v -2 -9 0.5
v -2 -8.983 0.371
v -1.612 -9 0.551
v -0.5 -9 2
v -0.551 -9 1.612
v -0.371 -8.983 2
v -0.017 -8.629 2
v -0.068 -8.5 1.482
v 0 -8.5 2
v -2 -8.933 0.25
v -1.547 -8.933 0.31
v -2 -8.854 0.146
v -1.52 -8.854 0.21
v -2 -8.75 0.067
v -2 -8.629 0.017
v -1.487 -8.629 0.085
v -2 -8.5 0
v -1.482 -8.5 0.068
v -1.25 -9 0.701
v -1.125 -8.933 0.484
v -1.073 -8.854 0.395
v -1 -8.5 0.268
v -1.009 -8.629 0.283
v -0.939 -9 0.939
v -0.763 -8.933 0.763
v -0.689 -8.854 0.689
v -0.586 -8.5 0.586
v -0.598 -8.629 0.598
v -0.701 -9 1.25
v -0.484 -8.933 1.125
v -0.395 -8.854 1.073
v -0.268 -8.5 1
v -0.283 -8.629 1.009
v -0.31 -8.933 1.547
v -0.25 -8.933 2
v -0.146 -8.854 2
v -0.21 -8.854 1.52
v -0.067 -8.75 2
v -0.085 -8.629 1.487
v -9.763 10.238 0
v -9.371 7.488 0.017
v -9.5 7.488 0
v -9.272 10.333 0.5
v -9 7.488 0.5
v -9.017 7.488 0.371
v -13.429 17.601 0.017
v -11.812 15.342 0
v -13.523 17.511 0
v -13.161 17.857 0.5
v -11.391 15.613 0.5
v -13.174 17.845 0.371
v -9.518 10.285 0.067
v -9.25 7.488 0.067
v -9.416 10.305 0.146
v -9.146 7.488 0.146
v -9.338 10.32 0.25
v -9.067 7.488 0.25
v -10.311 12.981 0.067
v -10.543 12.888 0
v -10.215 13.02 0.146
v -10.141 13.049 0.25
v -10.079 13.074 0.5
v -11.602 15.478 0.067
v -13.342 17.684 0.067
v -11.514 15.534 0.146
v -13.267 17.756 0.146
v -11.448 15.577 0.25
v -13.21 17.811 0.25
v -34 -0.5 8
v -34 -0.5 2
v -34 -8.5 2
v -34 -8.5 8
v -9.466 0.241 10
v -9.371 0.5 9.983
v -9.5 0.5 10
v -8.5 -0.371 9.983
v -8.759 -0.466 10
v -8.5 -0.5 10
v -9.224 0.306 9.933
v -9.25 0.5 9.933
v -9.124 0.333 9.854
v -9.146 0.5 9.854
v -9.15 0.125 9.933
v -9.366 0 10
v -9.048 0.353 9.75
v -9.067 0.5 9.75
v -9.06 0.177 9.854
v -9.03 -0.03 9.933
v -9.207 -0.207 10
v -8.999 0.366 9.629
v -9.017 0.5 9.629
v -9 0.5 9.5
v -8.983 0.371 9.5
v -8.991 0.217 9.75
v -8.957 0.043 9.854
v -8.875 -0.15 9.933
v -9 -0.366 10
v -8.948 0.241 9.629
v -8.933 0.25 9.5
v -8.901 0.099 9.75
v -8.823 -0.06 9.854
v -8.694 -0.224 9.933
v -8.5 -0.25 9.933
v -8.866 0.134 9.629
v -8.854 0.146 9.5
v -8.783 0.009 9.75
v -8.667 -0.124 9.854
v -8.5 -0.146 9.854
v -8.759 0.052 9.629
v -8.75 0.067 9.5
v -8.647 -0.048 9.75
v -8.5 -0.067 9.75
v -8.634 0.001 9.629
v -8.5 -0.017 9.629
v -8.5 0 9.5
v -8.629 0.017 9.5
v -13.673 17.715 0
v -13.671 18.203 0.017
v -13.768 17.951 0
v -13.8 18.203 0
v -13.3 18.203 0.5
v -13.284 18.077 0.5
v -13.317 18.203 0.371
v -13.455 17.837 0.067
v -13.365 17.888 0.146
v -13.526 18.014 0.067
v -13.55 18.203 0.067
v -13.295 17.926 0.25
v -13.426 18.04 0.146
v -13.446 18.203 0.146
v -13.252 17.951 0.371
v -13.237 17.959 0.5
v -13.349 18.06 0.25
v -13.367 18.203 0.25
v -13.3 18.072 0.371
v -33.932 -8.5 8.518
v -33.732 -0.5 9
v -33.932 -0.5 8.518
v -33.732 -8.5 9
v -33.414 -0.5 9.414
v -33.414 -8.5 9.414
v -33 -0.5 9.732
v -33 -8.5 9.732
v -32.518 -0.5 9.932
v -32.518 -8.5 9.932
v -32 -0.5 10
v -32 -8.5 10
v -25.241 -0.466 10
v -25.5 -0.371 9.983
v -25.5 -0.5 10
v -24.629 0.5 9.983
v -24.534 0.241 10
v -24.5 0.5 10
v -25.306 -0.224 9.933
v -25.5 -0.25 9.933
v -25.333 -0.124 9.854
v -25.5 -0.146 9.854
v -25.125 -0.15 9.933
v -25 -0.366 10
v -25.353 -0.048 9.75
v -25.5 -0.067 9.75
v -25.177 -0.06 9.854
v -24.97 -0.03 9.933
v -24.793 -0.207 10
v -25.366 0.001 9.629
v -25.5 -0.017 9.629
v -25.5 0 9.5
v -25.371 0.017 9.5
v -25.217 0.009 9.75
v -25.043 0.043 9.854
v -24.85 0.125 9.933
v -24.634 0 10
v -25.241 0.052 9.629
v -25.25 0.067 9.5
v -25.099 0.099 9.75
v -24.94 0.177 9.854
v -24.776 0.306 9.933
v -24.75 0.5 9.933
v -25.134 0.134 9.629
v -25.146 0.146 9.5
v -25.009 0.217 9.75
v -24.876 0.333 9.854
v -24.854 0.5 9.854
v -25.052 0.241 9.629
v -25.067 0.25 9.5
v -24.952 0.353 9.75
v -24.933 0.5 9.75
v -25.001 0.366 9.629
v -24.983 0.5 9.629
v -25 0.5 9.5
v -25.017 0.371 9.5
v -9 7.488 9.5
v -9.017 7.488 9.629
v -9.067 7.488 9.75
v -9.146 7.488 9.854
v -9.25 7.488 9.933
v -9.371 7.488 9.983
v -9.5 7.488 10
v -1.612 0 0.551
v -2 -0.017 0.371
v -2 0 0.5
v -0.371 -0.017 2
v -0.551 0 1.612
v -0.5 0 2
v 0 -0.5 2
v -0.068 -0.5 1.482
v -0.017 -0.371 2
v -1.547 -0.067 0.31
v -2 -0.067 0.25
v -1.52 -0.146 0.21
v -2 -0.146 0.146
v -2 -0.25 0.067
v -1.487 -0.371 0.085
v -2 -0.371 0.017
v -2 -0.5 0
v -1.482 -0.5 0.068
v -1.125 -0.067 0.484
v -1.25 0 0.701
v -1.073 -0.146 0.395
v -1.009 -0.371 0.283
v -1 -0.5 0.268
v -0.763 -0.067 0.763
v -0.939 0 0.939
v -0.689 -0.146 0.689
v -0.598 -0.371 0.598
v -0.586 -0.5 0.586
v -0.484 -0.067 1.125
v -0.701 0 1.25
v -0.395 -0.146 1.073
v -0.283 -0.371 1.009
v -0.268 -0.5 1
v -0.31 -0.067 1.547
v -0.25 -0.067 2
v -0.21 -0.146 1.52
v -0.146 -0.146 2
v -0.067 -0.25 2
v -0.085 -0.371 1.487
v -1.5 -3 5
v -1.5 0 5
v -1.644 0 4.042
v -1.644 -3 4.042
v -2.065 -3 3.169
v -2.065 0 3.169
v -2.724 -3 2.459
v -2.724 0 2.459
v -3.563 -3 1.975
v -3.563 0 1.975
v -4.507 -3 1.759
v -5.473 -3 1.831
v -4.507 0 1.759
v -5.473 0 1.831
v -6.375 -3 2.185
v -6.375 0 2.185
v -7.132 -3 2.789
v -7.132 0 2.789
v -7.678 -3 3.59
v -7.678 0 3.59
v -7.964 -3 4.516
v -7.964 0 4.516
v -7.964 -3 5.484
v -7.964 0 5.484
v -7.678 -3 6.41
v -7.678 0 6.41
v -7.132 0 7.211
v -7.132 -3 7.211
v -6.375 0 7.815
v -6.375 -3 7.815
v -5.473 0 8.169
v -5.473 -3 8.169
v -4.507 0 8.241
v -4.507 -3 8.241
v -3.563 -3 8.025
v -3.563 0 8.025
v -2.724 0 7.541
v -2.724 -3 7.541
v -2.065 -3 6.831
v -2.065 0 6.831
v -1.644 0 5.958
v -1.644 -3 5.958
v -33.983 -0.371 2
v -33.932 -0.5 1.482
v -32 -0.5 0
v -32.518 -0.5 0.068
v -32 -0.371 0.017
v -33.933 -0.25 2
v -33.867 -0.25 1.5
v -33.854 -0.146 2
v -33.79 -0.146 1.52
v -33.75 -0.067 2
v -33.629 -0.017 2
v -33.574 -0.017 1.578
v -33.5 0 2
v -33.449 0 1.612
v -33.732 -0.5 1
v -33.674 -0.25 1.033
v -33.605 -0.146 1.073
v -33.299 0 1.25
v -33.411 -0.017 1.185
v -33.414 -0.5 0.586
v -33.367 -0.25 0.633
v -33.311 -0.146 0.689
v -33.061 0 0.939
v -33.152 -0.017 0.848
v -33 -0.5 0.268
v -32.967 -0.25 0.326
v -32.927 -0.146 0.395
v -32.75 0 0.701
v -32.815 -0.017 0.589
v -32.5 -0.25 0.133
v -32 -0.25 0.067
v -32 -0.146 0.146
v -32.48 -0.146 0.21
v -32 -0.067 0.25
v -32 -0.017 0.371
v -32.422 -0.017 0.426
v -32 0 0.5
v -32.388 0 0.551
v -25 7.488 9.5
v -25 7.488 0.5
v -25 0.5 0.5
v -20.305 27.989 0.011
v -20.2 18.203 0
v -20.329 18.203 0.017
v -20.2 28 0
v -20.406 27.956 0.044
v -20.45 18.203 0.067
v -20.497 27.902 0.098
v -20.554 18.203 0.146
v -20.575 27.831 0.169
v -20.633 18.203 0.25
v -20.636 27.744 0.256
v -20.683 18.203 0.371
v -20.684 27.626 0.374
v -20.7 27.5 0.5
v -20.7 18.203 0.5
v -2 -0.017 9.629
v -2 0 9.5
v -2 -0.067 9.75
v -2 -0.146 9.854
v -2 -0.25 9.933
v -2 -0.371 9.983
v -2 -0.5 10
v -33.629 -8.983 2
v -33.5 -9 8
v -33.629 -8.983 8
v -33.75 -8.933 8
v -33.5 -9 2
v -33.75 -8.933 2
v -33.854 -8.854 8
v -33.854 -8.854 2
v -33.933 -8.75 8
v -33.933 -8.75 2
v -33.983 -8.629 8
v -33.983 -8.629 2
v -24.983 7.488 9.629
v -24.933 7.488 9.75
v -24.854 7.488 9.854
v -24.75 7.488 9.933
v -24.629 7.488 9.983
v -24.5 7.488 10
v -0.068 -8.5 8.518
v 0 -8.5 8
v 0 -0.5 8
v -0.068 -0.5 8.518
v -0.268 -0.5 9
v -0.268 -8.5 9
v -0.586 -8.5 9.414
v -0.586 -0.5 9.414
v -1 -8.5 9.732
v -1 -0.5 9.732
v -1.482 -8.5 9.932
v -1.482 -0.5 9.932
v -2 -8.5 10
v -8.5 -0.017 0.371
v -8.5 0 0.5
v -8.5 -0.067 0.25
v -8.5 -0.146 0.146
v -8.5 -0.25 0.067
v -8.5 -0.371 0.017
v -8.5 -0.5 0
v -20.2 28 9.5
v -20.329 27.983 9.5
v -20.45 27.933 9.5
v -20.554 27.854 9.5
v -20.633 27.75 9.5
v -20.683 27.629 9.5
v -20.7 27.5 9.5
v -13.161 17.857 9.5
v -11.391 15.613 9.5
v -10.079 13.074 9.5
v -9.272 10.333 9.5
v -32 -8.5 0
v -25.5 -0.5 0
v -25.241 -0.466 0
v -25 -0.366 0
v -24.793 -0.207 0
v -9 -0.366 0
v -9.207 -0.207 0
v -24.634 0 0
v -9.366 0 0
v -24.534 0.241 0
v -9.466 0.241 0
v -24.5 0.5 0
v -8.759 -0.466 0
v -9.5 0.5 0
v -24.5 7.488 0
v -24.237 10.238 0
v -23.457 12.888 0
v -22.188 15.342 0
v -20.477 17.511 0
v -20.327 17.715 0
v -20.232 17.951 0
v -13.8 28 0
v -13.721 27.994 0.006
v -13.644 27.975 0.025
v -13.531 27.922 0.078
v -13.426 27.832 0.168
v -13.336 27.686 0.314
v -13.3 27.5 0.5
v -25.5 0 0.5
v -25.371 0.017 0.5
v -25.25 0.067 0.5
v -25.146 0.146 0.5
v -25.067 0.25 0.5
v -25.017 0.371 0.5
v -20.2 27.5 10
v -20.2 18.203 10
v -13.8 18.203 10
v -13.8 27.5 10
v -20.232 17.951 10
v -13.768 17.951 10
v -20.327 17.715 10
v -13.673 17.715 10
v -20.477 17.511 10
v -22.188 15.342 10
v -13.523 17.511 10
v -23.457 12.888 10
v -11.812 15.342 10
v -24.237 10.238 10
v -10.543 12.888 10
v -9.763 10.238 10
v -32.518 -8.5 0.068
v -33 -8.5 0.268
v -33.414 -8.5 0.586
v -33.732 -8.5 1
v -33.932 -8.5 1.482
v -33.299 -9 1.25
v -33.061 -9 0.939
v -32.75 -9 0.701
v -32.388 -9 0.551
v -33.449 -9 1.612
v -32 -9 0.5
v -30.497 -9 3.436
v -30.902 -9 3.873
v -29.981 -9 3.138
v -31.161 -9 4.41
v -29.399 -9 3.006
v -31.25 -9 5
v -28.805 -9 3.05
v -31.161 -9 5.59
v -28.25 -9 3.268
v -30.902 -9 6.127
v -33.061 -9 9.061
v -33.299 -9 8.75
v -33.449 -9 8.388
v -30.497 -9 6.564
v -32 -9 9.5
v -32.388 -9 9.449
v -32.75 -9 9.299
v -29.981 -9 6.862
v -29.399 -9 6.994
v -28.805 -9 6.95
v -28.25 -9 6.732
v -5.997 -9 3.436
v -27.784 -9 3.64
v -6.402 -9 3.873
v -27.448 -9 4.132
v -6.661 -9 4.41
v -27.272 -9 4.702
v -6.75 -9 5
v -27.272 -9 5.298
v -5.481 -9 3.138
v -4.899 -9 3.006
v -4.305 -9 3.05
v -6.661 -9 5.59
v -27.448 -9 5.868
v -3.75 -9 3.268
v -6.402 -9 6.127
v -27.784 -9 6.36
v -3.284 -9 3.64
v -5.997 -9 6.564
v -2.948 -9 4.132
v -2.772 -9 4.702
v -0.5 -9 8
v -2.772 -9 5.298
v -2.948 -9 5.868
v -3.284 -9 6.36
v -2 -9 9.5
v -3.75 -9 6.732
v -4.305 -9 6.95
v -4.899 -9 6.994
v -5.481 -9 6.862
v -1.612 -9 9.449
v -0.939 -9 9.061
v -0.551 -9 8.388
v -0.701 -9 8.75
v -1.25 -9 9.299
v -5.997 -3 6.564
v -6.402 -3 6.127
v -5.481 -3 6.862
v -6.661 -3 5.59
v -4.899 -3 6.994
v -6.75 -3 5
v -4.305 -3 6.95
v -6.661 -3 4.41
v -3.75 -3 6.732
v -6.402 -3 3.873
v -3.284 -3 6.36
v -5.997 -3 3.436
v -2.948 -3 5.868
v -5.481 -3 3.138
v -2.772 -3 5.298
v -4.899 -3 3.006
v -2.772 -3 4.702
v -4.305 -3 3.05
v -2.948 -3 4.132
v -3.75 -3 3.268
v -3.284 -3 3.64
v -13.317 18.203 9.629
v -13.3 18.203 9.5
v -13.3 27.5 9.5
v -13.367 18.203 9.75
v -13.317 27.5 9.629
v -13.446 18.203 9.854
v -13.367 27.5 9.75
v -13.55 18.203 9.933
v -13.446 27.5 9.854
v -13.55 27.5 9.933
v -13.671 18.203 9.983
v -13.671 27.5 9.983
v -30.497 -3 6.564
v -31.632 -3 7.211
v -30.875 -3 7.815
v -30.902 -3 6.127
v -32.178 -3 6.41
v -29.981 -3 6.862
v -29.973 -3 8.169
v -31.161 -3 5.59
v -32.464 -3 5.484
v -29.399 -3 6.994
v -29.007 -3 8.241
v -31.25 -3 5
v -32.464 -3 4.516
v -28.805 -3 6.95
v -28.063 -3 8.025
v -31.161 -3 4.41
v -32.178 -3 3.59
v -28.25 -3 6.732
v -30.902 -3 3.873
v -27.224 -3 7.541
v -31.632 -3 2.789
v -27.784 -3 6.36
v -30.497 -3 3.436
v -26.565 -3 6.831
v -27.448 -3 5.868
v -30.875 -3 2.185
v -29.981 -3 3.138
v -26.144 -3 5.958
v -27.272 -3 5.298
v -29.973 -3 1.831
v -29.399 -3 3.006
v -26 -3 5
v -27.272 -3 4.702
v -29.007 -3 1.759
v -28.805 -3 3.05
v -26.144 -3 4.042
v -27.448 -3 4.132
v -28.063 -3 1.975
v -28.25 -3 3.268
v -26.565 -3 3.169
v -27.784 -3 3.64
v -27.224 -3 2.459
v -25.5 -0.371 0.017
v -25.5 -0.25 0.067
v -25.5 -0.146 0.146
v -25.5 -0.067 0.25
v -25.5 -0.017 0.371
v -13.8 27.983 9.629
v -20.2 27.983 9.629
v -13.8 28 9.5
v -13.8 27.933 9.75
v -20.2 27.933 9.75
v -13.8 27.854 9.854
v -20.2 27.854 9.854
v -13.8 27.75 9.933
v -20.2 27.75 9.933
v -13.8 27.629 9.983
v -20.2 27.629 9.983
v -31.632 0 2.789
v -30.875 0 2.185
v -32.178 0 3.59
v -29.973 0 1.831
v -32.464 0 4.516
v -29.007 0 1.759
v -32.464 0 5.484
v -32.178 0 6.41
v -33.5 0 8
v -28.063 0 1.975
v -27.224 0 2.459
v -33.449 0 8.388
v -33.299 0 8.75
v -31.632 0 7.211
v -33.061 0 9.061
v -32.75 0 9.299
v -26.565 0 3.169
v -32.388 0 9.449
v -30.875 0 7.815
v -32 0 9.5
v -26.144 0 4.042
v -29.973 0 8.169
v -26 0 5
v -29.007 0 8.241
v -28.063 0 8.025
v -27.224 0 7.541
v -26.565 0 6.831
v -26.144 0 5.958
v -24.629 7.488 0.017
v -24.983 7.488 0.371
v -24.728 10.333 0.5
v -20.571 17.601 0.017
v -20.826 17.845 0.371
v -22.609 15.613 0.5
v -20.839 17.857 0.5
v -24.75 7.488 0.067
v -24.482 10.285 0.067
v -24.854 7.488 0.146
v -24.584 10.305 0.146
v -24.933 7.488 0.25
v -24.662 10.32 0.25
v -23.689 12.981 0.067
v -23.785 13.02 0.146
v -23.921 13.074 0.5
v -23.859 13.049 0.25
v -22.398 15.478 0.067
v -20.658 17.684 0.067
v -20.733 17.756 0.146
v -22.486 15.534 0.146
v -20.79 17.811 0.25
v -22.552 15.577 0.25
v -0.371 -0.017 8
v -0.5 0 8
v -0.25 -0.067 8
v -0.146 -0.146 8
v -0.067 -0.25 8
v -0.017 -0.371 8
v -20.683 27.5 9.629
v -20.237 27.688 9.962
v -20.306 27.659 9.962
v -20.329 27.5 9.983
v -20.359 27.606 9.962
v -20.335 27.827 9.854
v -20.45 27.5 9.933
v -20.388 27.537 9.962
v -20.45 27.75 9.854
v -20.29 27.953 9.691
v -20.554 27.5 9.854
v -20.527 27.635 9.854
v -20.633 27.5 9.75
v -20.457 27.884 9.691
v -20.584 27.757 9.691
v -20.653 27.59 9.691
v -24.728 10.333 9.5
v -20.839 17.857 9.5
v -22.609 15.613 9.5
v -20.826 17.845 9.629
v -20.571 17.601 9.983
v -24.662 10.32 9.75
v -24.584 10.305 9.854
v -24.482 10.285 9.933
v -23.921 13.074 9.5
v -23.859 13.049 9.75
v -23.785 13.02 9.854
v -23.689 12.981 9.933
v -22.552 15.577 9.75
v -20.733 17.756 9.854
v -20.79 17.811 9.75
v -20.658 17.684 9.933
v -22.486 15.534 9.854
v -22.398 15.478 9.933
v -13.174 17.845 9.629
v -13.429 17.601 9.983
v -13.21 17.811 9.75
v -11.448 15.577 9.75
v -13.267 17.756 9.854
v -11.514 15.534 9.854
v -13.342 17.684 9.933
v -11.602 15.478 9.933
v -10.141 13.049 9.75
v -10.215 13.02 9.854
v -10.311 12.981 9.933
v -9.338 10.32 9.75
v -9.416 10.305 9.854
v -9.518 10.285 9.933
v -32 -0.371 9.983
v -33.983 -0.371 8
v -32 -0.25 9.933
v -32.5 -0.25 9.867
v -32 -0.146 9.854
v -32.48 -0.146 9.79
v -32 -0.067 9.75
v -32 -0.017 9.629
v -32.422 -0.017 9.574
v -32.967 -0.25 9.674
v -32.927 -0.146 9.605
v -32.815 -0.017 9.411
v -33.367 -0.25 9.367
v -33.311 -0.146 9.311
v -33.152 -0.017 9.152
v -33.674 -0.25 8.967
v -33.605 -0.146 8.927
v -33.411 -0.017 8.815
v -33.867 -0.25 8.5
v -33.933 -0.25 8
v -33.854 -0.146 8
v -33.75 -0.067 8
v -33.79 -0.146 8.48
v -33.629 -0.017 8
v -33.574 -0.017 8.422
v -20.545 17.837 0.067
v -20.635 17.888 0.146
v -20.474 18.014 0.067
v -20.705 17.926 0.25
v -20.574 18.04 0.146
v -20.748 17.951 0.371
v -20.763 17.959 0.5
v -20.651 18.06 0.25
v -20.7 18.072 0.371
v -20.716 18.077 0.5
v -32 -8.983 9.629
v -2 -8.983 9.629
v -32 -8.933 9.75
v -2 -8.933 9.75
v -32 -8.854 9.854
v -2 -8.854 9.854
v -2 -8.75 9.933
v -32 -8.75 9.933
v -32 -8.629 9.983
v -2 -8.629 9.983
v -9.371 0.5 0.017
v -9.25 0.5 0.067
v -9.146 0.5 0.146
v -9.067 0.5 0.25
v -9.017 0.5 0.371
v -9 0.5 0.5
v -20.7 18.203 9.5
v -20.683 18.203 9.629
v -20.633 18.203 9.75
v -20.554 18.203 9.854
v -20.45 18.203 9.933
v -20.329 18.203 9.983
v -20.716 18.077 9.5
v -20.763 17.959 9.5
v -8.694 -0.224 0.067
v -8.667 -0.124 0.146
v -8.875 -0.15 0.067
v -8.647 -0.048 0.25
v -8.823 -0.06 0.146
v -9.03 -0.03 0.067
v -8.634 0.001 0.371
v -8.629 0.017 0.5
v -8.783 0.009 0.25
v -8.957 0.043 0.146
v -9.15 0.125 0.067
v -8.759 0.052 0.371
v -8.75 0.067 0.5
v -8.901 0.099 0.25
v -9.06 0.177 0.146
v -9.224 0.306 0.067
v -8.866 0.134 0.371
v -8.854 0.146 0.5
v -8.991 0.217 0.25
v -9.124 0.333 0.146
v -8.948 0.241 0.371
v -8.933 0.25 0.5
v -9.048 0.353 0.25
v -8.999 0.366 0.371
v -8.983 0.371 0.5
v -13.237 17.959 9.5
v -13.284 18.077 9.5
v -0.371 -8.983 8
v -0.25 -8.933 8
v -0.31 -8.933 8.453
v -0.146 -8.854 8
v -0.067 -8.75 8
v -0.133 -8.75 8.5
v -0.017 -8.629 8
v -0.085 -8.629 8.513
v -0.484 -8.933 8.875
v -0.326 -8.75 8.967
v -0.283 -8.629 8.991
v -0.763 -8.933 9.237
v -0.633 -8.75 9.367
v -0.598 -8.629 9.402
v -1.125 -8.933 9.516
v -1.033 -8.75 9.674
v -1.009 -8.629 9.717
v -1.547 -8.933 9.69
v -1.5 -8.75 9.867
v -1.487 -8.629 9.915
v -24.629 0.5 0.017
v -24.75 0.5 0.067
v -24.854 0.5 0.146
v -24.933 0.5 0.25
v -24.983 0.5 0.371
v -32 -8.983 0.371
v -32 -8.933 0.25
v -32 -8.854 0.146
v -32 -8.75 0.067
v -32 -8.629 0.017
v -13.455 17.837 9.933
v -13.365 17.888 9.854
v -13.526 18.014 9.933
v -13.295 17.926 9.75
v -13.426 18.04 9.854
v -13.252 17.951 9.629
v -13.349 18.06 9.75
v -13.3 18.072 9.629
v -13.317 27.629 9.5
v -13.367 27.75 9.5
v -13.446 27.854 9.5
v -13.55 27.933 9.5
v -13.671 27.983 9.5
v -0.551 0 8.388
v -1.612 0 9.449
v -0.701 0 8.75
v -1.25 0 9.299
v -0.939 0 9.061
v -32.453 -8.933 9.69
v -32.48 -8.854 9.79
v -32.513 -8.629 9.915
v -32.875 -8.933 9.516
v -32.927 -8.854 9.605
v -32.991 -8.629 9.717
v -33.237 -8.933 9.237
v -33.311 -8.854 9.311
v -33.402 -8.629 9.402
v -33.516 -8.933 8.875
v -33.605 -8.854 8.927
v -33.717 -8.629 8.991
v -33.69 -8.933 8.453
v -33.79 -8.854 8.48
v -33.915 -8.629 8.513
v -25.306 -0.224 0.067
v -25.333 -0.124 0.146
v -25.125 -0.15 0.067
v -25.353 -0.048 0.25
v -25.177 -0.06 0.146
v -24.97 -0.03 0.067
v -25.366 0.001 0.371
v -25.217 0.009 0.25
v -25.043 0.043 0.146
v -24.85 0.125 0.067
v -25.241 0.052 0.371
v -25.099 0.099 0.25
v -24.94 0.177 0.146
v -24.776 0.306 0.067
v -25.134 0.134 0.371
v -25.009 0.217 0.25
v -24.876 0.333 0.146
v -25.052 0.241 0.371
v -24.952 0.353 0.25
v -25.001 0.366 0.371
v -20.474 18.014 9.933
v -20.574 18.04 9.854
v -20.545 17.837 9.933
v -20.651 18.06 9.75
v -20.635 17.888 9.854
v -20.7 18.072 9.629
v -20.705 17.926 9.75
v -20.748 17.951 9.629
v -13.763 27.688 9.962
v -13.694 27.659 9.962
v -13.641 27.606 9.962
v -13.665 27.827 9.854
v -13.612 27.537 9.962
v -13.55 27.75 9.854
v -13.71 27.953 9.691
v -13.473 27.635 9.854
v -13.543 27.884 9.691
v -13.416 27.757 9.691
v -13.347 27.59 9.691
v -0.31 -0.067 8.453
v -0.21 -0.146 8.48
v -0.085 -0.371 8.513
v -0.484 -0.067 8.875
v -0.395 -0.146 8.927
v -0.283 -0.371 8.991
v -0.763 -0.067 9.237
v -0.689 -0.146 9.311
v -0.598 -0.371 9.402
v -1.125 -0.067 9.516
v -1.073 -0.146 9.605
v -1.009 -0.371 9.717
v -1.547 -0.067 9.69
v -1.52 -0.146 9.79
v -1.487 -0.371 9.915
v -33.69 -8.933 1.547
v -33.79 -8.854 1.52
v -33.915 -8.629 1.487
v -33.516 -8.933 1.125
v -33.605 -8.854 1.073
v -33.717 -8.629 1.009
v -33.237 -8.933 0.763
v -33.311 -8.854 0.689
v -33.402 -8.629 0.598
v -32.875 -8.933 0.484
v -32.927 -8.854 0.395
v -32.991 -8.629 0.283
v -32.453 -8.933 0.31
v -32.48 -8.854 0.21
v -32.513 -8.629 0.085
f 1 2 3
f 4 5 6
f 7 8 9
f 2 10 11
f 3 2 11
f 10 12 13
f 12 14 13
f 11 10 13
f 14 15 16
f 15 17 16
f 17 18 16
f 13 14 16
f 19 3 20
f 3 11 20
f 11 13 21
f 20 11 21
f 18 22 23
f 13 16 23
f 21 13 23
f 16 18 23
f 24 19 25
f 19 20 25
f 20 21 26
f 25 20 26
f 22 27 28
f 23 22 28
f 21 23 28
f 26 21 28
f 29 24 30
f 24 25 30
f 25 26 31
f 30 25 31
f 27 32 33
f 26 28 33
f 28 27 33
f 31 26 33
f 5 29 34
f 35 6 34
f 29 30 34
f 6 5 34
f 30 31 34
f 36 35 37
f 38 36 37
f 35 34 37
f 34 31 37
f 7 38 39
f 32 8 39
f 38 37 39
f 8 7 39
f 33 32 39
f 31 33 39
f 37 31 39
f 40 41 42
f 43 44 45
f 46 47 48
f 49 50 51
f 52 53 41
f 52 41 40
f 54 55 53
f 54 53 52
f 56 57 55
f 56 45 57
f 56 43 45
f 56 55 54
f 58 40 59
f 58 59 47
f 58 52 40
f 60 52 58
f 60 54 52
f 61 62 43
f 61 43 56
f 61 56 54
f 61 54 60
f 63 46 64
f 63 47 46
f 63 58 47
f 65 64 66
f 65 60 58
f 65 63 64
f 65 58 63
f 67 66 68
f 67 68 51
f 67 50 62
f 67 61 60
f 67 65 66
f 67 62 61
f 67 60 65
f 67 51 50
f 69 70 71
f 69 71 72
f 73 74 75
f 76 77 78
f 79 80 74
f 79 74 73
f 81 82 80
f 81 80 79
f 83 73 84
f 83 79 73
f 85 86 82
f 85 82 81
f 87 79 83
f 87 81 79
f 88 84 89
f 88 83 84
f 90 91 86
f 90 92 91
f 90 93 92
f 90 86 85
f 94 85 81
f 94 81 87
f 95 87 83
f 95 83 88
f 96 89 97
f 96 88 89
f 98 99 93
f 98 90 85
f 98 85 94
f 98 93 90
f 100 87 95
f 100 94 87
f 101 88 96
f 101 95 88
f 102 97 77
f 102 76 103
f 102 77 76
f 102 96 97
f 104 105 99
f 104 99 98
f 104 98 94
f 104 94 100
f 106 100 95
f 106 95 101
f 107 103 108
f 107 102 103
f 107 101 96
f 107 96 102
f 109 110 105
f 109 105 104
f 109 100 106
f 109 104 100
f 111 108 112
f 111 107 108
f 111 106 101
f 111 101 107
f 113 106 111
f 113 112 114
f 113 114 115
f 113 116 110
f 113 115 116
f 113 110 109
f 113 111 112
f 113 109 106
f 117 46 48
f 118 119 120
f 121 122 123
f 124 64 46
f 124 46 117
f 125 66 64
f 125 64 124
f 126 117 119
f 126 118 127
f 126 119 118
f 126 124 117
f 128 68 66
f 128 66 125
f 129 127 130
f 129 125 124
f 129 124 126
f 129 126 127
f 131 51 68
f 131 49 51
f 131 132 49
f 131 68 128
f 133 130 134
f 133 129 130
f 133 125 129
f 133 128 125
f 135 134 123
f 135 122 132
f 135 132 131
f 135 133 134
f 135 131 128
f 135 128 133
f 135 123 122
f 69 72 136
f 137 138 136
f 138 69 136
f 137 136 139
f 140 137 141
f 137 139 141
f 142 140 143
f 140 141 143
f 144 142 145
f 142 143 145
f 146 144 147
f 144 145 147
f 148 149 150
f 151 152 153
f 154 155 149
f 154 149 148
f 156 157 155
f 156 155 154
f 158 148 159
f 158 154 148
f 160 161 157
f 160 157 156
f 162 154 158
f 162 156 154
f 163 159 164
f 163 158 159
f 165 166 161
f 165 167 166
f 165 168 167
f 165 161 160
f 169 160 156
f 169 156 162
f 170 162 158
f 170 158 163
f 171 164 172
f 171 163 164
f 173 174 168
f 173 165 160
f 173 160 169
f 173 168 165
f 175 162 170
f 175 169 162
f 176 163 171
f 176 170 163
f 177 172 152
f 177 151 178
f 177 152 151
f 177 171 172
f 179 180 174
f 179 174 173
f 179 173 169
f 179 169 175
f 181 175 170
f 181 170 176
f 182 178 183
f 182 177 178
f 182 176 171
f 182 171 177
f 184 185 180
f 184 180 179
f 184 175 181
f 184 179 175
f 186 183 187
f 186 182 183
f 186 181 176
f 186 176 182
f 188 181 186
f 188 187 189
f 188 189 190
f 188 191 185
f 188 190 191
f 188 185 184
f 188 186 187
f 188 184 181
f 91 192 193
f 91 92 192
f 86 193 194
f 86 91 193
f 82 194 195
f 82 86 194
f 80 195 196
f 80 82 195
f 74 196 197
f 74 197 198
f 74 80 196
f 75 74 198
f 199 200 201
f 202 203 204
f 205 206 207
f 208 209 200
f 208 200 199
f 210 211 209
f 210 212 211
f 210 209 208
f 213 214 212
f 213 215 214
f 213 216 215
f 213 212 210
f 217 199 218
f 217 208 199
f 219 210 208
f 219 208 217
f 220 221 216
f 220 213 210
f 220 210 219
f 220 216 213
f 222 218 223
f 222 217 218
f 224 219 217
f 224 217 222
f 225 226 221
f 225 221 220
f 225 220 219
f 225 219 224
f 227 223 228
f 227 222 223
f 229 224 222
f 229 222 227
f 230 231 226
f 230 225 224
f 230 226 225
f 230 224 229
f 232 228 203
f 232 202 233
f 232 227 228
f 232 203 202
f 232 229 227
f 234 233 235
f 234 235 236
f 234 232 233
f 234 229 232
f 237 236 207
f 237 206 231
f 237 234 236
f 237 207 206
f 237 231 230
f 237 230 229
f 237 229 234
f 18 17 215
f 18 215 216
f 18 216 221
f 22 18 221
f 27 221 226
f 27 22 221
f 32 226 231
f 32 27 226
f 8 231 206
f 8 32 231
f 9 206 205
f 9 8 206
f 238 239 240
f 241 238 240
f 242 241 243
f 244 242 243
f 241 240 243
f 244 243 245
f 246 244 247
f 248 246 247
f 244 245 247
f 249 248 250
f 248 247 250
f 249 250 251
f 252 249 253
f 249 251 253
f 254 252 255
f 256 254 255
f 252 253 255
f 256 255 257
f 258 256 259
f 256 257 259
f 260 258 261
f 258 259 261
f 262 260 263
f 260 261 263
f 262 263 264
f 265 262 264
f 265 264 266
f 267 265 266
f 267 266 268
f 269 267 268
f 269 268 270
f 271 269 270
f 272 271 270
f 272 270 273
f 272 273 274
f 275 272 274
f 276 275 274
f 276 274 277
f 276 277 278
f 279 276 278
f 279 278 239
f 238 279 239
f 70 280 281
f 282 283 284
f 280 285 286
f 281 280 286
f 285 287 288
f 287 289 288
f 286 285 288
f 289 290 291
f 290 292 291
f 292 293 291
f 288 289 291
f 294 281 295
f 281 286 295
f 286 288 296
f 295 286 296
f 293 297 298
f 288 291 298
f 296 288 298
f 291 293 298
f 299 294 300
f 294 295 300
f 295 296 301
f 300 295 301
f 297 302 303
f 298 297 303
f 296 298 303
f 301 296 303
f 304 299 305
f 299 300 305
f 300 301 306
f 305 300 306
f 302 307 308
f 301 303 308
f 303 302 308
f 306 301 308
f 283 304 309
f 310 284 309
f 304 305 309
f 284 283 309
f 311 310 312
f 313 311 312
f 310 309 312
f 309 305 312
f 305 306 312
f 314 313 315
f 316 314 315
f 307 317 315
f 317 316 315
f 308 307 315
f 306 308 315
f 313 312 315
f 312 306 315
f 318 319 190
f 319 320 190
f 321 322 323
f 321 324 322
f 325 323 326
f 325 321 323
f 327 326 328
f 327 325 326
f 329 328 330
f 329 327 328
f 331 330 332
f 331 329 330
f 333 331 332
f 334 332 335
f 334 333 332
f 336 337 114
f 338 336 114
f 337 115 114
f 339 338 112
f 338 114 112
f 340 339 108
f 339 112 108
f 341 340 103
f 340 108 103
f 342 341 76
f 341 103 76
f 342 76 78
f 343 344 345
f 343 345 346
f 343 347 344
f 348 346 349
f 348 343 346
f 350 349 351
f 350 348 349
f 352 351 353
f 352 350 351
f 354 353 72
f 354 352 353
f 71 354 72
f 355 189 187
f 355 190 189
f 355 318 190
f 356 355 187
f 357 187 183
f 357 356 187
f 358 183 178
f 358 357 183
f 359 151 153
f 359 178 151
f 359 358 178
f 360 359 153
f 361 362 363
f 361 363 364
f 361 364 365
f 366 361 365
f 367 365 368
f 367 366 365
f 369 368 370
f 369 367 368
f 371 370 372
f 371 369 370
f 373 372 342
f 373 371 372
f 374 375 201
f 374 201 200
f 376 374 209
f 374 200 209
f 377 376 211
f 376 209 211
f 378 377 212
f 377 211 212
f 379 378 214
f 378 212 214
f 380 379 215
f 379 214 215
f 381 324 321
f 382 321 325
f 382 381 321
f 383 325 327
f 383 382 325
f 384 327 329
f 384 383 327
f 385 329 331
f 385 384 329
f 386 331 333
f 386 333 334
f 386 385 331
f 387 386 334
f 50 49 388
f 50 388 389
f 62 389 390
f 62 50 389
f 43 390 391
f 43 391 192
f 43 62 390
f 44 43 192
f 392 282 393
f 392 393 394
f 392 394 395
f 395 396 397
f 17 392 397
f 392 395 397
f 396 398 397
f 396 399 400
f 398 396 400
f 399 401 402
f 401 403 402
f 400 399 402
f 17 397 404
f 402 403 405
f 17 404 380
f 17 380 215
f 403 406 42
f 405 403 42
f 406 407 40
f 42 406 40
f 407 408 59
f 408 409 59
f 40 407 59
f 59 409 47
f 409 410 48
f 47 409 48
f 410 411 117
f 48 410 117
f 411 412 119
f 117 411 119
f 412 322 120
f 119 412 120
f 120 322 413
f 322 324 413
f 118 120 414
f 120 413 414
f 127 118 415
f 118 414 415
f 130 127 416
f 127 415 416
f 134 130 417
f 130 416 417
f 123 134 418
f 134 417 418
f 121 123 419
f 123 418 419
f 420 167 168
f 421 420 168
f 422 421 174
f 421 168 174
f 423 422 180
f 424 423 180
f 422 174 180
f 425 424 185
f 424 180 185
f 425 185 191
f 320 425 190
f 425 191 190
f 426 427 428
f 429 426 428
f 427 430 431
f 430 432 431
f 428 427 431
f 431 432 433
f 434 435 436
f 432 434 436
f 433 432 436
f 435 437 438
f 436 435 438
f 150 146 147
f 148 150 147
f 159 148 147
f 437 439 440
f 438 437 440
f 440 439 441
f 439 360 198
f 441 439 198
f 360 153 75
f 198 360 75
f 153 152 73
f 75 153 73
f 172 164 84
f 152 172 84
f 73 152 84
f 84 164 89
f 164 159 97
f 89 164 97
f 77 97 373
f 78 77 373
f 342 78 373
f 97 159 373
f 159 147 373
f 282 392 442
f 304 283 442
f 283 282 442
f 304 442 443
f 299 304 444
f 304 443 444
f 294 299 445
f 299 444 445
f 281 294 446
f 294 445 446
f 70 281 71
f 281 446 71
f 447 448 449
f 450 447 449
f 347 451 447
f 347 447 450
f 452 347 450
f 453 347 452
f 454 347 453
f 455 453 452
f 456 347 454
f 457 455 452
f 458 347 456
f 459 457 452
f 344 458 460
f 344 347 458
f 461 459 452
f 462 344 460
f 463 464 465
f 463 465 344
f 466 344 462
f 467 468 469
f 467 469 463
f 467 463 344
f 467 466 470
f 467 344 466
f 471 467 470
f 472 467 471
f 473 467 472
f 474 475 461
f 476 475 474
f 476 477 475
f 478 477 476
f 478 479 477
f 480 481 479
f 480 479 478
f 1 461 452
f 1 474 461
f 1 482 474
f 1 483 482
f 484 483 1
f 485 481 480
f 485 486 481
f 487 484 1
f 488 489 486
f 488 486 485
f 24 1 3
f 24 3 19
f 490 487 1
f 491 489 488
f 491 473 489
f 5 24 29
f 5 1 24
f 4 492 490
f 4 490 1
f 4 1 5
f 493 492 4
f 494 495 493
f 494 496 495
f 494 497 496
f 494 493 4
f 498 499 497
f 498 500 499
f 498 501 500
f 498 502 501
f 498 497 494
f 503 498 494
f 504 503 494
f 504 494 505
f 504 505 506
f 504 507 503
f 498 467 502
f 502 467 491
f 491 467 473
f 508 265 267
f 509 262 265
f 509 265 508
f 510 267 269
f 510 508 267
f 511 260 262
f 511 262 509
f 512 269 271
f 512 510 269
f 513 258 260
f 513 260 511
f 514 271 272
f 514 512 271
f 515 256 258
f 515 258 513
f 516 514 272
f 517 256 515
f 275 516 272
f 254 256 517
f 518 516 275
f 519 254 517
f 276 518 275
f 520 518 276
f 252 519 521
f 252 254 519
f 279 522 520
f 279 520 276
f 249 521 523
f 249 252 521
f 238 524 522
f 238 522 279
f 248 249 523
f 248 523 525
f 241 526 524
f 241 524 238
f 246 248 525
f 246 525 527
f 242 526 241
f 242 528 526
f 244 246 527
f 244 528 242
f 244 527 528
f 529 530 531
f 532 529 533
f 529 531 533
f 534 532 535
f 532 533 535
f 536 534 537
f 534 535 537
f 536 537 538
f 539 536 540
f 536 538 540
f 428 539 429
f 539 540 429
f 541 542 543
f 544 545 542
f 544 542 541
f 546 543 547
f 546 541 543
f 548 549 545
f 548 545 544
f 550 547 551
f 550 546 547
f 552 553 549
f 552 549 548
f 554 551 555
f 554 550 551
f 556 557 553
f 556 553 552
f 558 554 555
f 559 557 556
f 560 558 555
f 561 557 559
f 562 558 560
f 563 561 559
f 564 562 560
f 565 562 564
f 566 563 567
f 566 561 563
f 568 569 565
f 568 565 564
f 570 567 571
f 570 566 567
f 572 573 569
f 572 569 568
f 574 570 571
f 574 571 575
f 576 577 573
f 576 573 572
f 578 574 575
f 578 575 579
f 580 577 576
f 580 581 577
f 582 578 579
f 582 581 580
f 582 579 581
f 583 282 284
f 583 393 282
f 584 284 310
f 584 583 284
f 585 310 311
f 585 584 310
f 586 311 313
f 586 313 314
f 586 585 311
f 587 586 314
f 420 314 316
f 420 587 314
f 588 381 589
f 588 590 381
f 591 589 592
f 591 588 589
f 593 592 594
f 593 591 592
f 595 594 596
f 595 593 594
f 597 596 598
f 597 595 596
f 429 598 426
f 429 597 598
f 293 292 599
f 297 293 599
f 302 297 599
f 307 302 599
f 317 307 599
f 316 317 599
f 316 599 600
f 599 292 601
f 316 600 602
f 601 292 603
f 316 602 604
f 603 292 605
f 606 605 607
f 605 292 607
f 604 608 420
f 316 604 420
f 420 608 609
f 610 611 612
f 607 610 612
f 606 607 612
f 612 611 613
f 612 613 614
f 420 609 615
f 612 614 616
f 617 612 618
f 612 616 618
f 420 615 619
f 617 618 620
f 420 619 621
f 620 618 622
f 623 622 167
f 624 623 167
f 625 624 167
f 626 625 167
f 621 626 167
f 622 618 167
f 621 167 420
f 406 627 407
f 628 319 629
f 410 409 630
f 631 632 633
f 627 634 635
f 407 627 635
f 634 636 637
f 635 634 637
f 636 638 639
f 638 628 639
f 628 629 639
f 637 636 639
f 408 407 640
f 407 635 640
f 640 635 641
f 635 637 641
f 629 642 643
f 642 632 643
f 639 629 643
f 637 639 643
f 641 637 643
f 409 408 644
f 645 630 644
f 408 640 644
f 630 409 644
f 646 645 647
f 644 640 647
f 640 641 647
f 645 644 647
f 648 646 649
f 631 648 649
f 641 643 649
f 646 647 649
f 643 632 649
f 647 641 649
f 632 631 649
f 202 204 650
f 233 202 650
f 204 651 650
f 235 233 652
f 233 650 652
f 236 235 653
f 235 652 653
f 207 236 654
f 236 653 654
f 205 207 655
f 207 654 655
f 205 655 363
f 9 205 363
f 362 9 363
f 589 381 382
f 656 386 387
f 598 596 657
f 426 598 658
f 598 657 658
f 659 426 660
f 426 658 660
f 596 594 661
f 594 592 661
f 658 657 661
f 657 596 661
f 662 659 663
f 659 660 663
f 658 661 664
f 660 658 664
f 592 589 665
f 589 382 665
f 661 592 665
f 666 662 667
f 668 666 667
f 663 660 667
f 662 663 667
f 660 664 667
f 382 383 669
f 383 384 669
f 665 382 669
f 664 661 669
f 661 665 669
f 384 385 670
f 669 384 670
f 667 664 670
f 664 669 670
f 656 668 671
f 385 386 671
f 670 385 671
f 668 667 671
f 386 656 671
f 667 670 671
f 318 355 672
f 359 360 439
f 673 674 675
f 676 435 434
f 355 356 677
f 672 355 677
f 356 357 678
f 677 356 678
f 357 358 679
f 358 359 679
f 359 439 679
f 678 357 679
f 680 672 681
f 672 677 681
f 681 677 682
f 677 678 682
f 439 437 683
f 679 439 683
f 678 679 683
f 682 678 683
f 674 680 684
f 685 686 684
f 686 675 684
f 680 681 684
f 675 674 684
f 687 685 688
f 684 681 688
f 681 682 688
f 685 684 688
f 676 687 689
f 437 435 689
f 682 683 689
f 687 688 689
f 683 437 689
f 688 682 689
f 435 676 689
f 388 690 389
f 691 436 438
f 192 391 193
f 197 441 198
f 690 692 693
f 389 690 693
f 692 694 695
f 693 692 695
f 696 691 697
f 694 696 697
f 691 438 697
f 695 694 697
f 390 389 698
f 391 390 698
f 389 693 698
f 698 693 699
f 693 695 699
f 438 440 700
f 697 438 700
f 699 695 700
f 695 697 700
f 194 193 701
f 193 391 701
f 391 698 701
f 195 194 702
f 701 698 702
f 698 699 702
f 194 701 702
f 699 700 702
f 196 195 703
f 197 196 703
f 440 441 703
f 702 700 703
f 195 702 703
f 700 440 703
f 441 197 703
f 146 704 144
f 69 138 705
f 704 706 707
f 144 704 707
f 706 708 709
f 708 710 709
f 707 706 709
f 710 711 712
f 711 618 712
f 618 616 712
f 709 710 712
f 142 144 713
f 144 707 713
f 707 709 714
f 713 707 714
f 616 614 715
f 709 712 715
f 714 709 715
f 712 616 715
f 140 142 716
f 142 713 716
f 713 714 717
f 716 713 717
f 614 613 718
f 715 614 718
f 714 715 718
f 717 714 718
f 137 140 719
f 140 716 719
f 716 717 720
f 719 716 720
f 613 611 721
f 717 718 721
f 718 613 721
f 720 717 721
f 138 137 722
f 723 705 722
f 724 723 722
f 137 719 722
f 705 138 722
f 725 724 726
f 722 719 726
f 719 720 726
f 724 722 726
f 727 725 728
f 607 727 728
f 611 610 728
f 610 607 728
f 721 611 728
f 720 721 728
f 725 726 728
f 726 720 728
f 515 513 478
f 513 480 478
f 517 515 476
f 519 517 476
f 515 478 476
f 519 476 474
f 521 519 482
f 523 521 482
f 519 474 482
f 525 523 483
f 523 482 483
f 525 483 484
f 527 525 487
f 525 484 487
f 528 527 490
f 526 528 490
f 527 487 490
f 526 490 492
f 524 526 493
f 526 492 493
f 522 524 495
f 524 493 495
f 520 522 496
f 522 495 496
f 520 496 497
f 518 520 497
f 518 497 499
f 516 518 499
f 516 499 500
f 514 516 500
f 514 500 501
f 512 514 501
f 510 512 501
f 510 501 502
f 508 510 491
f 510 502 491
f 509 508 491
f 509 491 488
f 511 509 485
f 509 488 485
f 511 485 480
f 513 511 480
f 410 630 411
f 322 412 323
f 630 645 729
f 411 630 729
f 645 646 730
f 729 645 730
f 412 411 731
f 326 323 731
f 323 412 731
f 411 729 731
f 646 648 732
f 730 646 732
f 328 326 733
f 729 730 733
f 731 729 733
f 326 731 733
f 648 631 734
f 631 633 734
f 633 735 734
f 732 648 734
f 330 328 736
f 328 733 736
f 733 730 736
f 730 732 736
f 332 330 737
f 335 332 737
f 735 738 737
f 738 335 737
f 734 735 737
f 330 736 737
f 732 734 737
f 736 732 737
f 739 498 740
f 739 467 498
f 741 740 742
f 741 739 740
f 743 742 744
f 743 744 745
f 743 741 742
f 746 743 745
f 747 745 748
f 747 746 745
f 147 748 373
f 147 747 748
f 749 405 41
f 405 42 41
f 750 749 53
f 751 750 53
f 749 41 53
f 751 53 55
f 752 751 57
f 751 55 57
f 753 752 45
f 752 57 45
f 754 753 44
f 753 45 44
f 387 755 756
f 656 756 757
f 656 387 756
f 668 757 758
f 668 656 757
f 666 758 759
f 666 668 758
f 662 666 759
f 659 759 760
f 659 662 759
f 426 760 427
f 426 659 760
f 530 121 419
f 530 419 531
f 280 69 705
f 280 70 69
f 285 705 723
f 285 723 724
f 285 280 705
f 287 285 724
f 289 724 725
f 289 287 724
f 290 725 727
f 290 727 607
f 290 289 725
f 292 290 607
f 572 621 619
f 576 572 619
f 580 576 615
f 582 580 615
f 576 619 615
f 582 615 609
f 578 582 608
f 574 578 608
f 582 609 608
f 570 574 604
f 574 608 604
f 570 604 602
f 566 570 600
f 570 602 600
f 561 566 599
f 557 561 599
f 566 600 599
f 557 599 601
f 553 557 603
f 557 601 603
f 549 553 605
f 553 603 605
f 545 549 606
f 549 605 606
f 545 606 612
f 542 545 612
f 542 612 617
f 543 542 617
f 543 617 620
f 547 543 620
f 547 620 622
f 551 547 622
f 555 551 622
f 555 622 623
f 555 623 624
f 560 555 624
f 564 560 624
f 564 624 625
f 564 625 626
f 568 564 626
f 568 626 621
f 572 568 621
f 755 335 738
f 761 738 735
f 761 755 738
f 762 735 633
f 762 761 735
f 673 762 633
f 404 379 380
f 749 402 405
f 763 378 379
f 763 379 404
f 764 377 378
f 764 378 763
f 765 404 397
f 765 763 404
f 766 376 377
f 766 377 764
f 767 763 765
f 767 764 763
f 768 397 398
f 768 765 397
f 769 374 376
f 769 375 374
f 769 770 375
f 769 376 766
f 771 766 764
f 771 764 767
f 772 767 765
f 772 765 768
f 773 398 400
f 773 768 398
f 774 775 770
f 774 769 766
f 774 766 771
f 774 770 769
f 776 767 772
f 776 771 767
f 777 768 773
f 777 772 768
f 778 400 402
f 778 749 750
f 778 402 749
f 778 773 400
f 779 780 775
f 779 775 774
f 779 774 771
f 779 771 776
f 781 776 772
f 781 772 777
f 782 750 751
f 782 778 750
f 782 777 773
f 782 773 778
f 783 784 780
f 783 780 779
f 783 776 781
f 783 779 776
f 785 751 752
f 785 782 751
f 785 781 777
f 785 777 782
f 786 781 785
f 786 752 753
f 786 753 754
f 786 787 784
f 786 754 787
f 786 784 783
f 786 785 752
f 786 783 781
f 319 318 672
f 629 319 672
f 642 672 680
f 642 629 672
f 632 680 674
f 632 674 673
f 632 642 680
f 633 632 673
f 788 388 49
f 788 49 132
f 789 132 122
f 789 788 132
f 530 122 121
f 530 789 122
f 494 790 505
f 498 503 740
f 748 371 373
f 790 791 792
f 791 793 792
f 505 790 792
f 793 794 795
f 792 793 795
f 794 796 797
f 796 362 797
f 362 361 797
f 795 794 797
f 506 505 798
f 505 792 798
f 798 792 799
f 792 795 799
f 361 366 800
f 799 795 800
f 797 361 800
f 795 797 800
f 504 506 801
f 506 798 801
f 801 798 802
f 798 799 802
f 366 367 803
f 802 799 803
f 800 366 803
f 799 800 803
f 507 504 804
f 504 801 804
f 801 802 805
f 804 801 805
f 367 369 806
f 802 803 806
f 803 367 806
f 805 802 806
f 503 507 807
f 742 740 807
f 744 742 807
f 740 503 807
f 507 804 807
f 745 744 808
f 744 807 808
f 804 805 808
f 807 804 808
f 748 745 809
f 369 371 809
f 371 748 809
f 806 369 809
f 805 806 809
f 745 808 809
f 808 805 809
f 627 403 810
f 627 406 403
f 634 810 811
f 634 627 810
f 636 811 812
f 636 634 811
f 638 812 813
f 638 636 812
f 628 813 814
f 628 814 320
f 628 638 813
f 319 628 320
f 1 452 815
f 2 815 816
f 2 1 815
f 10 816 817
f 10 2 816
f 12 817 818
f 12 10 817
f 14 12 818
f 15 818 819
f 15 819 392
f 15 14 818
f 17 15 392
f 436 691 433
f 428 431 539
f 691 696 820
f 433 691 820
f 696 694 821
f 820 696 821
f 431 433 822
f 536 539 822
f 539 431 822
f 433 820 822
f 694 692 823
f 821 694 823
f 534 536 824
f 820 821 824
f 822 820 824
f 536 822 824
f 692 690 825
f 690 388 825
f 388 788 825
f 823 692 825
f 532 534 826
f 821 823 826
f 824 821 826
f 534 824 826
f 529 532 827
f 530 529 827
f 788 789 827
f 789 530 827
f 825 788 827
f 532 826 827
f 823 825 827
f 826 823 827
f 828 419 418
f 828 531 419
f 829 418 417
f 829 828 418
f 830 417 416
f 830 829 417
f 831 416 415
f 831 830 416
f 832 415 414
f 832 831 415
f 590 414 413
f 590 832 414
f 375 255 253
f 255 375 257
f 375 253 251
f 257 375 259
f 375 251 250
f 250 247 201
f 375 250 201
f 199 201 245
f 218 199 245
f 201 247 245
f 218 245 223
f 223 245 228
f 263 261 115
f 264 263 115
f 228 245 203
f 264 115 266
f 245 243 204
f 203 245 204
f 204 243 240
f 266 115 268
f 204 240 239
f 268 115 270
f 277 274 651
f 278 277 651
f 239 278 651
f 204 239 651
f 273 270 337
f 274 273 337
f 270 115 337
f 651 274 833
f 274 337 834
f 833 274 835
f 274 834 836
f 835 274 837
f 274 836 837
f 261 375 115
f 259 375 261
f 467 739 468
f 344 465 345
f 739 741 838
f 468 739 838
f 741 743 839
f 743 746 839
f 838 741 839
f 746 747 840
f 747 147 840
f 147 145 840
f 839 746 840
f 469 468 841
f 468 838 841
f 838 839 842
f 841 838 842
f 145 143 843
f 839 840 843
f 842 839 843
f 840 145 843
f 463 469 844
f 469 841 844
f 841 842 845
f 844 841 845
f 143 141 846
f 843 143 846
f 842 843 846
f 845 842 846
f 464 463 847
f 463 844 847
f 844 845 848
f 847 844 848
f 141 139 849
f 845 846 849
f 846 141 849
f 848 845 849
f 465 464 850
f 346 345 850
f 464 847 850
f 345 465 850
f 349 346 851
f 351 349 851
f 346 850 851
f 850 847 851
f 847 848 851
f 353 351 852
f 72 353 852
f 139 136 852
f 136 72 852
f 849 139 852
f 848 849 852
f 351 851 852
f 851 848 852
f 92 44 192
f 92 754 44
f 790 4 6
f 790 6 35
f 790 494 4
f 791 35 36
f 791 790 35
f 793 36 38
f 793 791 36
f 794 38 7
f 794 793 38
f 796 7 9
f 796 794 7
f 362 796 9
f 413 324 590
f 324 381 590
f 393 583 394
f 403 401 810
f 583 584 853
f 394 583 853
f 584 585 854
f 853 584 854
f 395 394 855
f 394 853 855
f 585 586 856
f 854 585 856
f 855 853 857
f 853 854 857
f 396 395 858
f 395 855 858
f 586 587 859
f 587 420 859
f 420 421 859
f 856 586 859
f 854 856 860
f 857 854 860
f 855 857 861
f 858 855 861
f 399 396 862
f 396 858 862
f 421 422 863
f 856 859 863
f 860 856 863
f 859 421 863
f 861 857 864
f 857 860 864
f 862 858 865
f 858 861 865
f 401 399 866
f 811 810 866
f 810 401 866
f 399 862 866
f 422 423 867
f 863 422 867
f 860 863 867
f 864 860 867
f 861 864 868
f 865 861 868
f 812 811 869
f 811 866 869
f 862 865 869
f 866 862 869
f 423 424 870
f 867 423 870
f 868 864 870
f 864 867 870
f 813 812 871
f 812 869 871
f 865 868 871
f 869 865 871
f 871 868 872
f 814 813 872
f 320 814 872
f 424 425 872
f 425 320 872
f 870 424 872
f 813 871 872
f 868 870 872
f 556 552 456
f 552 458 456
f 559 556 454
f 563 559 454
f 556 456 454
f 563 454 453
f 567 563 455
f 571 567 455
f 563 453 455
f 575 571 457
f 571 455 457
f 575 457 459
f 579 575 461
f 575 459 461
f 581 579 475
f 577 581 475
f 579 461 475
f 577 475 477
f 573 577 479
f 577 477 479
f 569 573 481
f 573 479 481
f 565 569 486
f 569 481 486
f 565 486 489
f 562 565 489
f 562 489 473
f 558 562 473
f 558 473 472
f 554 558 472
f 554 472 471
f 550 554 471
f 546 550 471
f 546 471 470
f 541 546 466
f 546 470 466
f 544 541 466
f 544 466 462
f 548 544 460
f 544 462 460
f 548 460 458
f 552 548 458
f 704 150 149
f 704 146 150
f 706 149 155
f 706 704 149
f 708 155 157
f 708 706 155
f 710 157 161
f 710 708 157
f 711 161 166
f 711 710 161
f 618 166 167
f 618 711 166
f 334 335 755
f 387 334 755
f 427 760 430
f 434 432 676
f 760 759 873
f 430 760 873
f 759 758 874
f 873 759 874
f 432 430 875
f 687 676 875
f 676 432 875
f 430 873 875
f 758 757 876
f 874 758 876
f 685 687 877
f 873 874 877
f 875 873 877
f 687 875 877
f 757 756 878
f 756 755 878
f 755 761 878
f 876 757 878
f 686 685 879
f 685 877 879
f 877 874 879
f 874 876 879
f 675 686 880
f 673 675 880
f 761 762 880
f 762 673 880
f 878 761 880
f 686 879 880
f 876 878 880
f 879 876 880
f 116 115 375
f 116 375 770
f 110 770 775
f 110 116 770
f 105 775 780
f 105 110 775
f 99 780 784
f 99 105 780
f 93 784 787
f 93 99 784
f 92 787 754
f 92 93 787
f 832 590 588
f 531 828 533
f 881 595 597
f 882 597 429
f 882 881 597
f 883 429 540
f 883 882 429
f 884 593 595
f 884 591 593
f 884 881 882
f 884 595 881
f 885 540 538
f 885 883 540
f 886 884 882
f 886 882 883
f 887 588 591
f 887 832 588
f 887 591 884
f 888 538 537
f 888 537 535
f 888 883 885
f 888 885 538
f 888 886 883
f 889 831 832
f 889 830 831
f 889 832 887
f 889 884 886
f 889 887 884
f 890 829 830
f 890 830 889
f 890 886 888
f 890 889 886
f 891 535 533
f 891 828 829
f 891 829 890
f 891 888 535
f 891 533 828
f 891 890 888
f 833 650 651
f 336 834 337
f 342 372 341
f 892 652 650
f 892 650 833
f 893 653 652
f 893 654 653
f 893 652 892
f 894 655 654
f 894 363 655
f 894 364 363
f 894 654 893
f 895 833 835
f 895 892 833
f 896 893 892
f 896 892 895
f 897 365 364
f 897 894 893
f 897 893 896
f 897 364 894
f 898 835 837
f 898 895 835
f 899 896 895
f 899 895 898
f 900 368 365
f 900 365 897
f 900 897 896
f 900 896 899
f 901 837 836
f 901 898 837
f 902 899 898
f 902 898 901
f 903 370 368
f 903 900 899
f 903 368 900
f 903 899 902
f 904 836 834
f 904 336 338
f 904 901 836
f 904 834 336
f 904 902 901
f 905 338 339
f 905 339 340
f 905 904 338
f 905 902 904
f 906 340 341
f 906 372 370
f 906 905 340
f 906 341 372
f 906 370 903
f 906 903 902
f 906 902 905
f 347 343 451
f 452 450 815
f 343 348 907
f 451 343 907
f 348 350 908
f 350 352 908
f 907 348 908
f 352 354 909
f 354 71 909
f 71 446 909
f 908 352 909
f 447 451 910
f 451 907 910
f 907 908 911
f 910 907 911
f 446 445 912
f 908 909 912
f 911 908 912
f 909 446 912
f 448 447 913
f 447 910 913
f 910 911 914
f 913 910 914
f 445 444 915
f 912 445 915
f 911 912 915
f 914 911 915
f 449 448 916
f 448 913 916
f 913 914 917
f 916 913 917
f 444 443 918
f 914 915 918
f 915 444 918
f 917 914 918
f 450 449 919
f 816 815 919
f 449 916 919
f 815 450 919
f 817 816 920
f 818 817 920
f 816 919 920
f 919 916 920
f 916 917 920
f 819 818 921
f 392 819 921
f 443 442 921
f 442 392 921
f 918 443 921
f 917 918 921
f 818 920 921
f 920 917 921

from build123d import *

# Parameters (mm, degrees)
F0_W           = 9
F0_H           = 10
F0_W_2         = 4.3
F0_W_3         = 7.4
F1_DEPTH       = 9
F2_D           = 4
F2_DEPTH       = 12
F2_CBORE_D     = 6.5
F2_CBORE_DEPTH = 3
F2_TIP         = 1.2017212381
F3_DEPTH       = 18
F4_DEPTH       = 28
F5_T1_DEPTH    = 62.5618683077
F6_R           = 2
F7_R           = 0.5


# Not quite as in the source:
# - a fillet or chamfer that OpenCascade refuses, or shapes differently, is made with other operations: its cross-section is extruded or revolved along the edge and cut away or added


with BuildPart() as f1:
    # F0 (on Front) → F1 (new body)
    with BuildSketch(Plane.XZ):
        with Locations((-4.5, 5)):
            Rectangle(F0_W, F0_H)
        with Locations((-11.15, 5)):
            Rectangle(F0_W_2, F0_H)
        with Locations((-17, 5)):
            Rectangle(F0_W_3, F0_H)
        with Locations((-22.85, 5)):
            Rectangle(F0_W_2, F0_H)
        with Locations((-29.5, 5)):
            Rectangle(F0_W, F0_H)
    extrude(amount=F1_DEPTH)

    # F2
    with Locations(Plane(origin=(0, 0, 0), x_dir=(1, 0, 0), z_dir=(0, 1, 0))):
        with Locations((-29.25, -5), (-4.75, -5)):
            CounterBoreHole(F2_D / 2, F2_CBORE_D / 2, F2_CBORE_DEPTH, depth=F2_DEPTH)
            with Locations((0, 0, -(F2_DEPTH + F2_TIP / 2))):  # 118° drill point
                Cone(0, F2_D / 2, F2_TIP, mode=Mode.SUBTRACT)

    # F0 (on Front) → F3 (join)
    with BuildSketch(Plane.XZ):
        with Locations((-22.85, 5)):
            Rectangle(F0_W_2, F0_H)
        with Locations((-17, 5)):
            Rectangle(F0_W_3, F0_H)
        with Locations((-11.15, 5)):
            Rectangle(F0_W_2, F0_H)
    extrude(amount=-F3_DEPTH)

    # F0 (on Front) → F4 (join)
    with BuildSketch(Plane.XZ):
        with Locations((-17, 5)):
            Rectangle(F0_W_3, F0_H)
    extrude(amount=-F4_DEPTH)

    # F5: fillet of radius 15 on 2 edges, made by hand

    # F5_s2 → F5_t1 (cut)
    with BuildSketch(Plane.XY.offset(-26.2809341539)):
        with BuildLine():
            ThreePointArc((-13.3, 18), (-10.1165566231, 13.1665346843), (-9, 7.4876263385))
            Line((-9, 7.4876263385), (-9, 18))
            Line((-9, 18), (-13.3, 18))
        make_face()
        with BuildLine():
            ThreePointArc((-25, 7.4876263385), (-23.8834433769, 13.1665346843), (-20.7, 18))
            Line((-20.7, 18), (-25, 18))
            Line((-25, 18), (-25, 7.4876263385))
        make_face()
    extrude(amount=F5_T1_DEPTH, mode=Mode.SUBTRACT)

    # F6
    f6_edges = [f1.edges().sort_by_distance(p)[0] for p in [
        (0, -4.5, 10),
        (0, -4.5, 0),
        (-34, -4.5, 0),
        (-34, -4.5, 10),
    ]]
    fillet(f6_edges, radius=F6_R)

    # F7
    f7_edges = [f1.edges().sort_by_distance(p)[0] for p in [
        (-9, 0, 5),
        (-25, 0, 5),
        (-25, 7.487626, 5),
        (-20.7, 18, 5),
        (-13.3, 18, 5),
        (-13.3, 28, 5),
        (-20.7, 28, 5),
        (-17, 28, 10),
        (-20.7, 23, 10),
        (-10.116557, 13.166535, 10),
        (-17, -9, 10),
        (0, 0, 5),
        (0, -9, 5),
        (-5.5, 0, 0),
        (-0.585786, 0, 0.585786),
        (-5.5, 0, 10),
        (-0.585786, 0, 9.414214),
        (-0.585786, -9, 0.585786),
        (-0.585786, -9, 9.414214),
        (-17, -9, 0),
        (-33.414214, -9, 0.585786),
        (-33.414214, -9, 9.414214),
        (-34, -9, 5),
        (-28.5, 0, 0),
        (-25, 3.743813, 0),
        (-23.883443, 13.166535, 0),
        (-20.7, 23, 0),
        (-9, 3.743813, 0),
        (-13.3, 23, 0),
        (-10.116557, 13.166535, 0),
        (-9, 3.743813, 10),
        (-13.3, 23, 10),
        (-28.5, 0, 10),
        (-25, 3.743813, 10),
        (-23.883443, 13.166535, 10),
        (-33.414214, 0, 0.585786),
        (-33.414214, 0, 9.414214),
        (-34, 0, 5),
    ]]
    fillet(f7_edges, radius=F7_R)


solid = f1.part
